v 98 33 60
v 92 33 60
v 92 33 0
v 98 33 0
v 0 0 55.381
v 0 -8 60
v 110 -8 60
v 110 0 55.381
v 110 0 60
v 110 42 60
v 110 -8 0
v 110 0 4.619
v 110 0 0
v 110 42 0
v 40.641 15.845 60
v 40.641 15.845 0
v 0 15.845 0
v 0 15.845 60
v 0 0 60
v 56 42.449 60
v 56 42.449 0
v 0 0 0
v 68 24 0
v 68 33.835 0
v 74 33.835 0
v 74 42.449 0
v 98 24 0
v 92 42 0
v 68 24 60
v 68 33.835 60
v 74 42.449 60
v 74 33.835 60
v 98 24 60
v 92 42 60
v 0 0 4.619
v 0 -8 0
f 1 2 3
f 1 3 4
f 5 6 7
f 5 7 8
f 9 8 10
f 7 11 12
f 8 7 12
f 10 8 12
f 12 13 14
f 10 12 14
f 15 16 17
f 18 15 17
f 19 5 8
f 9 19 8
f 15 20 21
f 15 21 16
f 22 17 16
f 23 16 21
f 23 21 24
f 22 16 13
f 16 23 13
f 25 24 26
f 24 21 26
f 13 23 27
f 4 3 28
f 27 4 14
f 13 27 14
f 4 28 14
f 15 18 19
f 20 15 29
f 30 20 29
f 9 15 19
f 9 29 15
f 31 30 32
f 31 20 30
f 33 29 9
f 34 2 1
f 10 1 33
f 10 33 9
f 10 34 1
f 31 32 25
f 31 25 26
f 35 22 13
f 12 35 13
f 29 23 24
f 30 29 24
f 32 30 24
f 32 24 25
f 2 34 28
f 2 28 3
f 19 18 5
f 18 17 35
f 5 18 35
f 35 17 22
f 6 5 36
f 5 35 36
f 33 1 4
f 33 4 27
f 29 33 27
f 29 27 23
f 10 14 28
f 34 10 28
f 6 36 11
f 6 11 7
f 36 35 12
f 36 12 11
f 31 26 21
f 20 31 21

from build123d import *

# Parameters (mm, degrees)
BOSS_EXTRUDE1_DEPTH = 60
BOSS_EXTRUDE2_DEPTH = 110


with BuildPart() as part:
    # Sketch1 → Boss-Extrude1 (new body)
    with BuildSketch(Plane.XY):
        Polygon((0, 0), (110, 0), (110, 42), (92, 42), (92, 33), (98, 33), (98, 24), (68, 24), (68, 33.834738617), (74, 33.834738617), (74, 42.44856661), (56, 42.44856661), (40.640659473, 15.845408447), (0, 15.845408447), align=None)
    extrude(amount=BOSS_EXTRUDE1_DEPTH)

    # Sketch2 → Boss-Extrude2 (add)
    with BuildSketch(Plane.ZY):
        Polygon((0, -8), (60, -8), (55.381197846, 0), (4.618802154, 0), align=None)
    extrude(amount=-BOSS_EXTRUDE2_DEPTH)


solid = part.part
